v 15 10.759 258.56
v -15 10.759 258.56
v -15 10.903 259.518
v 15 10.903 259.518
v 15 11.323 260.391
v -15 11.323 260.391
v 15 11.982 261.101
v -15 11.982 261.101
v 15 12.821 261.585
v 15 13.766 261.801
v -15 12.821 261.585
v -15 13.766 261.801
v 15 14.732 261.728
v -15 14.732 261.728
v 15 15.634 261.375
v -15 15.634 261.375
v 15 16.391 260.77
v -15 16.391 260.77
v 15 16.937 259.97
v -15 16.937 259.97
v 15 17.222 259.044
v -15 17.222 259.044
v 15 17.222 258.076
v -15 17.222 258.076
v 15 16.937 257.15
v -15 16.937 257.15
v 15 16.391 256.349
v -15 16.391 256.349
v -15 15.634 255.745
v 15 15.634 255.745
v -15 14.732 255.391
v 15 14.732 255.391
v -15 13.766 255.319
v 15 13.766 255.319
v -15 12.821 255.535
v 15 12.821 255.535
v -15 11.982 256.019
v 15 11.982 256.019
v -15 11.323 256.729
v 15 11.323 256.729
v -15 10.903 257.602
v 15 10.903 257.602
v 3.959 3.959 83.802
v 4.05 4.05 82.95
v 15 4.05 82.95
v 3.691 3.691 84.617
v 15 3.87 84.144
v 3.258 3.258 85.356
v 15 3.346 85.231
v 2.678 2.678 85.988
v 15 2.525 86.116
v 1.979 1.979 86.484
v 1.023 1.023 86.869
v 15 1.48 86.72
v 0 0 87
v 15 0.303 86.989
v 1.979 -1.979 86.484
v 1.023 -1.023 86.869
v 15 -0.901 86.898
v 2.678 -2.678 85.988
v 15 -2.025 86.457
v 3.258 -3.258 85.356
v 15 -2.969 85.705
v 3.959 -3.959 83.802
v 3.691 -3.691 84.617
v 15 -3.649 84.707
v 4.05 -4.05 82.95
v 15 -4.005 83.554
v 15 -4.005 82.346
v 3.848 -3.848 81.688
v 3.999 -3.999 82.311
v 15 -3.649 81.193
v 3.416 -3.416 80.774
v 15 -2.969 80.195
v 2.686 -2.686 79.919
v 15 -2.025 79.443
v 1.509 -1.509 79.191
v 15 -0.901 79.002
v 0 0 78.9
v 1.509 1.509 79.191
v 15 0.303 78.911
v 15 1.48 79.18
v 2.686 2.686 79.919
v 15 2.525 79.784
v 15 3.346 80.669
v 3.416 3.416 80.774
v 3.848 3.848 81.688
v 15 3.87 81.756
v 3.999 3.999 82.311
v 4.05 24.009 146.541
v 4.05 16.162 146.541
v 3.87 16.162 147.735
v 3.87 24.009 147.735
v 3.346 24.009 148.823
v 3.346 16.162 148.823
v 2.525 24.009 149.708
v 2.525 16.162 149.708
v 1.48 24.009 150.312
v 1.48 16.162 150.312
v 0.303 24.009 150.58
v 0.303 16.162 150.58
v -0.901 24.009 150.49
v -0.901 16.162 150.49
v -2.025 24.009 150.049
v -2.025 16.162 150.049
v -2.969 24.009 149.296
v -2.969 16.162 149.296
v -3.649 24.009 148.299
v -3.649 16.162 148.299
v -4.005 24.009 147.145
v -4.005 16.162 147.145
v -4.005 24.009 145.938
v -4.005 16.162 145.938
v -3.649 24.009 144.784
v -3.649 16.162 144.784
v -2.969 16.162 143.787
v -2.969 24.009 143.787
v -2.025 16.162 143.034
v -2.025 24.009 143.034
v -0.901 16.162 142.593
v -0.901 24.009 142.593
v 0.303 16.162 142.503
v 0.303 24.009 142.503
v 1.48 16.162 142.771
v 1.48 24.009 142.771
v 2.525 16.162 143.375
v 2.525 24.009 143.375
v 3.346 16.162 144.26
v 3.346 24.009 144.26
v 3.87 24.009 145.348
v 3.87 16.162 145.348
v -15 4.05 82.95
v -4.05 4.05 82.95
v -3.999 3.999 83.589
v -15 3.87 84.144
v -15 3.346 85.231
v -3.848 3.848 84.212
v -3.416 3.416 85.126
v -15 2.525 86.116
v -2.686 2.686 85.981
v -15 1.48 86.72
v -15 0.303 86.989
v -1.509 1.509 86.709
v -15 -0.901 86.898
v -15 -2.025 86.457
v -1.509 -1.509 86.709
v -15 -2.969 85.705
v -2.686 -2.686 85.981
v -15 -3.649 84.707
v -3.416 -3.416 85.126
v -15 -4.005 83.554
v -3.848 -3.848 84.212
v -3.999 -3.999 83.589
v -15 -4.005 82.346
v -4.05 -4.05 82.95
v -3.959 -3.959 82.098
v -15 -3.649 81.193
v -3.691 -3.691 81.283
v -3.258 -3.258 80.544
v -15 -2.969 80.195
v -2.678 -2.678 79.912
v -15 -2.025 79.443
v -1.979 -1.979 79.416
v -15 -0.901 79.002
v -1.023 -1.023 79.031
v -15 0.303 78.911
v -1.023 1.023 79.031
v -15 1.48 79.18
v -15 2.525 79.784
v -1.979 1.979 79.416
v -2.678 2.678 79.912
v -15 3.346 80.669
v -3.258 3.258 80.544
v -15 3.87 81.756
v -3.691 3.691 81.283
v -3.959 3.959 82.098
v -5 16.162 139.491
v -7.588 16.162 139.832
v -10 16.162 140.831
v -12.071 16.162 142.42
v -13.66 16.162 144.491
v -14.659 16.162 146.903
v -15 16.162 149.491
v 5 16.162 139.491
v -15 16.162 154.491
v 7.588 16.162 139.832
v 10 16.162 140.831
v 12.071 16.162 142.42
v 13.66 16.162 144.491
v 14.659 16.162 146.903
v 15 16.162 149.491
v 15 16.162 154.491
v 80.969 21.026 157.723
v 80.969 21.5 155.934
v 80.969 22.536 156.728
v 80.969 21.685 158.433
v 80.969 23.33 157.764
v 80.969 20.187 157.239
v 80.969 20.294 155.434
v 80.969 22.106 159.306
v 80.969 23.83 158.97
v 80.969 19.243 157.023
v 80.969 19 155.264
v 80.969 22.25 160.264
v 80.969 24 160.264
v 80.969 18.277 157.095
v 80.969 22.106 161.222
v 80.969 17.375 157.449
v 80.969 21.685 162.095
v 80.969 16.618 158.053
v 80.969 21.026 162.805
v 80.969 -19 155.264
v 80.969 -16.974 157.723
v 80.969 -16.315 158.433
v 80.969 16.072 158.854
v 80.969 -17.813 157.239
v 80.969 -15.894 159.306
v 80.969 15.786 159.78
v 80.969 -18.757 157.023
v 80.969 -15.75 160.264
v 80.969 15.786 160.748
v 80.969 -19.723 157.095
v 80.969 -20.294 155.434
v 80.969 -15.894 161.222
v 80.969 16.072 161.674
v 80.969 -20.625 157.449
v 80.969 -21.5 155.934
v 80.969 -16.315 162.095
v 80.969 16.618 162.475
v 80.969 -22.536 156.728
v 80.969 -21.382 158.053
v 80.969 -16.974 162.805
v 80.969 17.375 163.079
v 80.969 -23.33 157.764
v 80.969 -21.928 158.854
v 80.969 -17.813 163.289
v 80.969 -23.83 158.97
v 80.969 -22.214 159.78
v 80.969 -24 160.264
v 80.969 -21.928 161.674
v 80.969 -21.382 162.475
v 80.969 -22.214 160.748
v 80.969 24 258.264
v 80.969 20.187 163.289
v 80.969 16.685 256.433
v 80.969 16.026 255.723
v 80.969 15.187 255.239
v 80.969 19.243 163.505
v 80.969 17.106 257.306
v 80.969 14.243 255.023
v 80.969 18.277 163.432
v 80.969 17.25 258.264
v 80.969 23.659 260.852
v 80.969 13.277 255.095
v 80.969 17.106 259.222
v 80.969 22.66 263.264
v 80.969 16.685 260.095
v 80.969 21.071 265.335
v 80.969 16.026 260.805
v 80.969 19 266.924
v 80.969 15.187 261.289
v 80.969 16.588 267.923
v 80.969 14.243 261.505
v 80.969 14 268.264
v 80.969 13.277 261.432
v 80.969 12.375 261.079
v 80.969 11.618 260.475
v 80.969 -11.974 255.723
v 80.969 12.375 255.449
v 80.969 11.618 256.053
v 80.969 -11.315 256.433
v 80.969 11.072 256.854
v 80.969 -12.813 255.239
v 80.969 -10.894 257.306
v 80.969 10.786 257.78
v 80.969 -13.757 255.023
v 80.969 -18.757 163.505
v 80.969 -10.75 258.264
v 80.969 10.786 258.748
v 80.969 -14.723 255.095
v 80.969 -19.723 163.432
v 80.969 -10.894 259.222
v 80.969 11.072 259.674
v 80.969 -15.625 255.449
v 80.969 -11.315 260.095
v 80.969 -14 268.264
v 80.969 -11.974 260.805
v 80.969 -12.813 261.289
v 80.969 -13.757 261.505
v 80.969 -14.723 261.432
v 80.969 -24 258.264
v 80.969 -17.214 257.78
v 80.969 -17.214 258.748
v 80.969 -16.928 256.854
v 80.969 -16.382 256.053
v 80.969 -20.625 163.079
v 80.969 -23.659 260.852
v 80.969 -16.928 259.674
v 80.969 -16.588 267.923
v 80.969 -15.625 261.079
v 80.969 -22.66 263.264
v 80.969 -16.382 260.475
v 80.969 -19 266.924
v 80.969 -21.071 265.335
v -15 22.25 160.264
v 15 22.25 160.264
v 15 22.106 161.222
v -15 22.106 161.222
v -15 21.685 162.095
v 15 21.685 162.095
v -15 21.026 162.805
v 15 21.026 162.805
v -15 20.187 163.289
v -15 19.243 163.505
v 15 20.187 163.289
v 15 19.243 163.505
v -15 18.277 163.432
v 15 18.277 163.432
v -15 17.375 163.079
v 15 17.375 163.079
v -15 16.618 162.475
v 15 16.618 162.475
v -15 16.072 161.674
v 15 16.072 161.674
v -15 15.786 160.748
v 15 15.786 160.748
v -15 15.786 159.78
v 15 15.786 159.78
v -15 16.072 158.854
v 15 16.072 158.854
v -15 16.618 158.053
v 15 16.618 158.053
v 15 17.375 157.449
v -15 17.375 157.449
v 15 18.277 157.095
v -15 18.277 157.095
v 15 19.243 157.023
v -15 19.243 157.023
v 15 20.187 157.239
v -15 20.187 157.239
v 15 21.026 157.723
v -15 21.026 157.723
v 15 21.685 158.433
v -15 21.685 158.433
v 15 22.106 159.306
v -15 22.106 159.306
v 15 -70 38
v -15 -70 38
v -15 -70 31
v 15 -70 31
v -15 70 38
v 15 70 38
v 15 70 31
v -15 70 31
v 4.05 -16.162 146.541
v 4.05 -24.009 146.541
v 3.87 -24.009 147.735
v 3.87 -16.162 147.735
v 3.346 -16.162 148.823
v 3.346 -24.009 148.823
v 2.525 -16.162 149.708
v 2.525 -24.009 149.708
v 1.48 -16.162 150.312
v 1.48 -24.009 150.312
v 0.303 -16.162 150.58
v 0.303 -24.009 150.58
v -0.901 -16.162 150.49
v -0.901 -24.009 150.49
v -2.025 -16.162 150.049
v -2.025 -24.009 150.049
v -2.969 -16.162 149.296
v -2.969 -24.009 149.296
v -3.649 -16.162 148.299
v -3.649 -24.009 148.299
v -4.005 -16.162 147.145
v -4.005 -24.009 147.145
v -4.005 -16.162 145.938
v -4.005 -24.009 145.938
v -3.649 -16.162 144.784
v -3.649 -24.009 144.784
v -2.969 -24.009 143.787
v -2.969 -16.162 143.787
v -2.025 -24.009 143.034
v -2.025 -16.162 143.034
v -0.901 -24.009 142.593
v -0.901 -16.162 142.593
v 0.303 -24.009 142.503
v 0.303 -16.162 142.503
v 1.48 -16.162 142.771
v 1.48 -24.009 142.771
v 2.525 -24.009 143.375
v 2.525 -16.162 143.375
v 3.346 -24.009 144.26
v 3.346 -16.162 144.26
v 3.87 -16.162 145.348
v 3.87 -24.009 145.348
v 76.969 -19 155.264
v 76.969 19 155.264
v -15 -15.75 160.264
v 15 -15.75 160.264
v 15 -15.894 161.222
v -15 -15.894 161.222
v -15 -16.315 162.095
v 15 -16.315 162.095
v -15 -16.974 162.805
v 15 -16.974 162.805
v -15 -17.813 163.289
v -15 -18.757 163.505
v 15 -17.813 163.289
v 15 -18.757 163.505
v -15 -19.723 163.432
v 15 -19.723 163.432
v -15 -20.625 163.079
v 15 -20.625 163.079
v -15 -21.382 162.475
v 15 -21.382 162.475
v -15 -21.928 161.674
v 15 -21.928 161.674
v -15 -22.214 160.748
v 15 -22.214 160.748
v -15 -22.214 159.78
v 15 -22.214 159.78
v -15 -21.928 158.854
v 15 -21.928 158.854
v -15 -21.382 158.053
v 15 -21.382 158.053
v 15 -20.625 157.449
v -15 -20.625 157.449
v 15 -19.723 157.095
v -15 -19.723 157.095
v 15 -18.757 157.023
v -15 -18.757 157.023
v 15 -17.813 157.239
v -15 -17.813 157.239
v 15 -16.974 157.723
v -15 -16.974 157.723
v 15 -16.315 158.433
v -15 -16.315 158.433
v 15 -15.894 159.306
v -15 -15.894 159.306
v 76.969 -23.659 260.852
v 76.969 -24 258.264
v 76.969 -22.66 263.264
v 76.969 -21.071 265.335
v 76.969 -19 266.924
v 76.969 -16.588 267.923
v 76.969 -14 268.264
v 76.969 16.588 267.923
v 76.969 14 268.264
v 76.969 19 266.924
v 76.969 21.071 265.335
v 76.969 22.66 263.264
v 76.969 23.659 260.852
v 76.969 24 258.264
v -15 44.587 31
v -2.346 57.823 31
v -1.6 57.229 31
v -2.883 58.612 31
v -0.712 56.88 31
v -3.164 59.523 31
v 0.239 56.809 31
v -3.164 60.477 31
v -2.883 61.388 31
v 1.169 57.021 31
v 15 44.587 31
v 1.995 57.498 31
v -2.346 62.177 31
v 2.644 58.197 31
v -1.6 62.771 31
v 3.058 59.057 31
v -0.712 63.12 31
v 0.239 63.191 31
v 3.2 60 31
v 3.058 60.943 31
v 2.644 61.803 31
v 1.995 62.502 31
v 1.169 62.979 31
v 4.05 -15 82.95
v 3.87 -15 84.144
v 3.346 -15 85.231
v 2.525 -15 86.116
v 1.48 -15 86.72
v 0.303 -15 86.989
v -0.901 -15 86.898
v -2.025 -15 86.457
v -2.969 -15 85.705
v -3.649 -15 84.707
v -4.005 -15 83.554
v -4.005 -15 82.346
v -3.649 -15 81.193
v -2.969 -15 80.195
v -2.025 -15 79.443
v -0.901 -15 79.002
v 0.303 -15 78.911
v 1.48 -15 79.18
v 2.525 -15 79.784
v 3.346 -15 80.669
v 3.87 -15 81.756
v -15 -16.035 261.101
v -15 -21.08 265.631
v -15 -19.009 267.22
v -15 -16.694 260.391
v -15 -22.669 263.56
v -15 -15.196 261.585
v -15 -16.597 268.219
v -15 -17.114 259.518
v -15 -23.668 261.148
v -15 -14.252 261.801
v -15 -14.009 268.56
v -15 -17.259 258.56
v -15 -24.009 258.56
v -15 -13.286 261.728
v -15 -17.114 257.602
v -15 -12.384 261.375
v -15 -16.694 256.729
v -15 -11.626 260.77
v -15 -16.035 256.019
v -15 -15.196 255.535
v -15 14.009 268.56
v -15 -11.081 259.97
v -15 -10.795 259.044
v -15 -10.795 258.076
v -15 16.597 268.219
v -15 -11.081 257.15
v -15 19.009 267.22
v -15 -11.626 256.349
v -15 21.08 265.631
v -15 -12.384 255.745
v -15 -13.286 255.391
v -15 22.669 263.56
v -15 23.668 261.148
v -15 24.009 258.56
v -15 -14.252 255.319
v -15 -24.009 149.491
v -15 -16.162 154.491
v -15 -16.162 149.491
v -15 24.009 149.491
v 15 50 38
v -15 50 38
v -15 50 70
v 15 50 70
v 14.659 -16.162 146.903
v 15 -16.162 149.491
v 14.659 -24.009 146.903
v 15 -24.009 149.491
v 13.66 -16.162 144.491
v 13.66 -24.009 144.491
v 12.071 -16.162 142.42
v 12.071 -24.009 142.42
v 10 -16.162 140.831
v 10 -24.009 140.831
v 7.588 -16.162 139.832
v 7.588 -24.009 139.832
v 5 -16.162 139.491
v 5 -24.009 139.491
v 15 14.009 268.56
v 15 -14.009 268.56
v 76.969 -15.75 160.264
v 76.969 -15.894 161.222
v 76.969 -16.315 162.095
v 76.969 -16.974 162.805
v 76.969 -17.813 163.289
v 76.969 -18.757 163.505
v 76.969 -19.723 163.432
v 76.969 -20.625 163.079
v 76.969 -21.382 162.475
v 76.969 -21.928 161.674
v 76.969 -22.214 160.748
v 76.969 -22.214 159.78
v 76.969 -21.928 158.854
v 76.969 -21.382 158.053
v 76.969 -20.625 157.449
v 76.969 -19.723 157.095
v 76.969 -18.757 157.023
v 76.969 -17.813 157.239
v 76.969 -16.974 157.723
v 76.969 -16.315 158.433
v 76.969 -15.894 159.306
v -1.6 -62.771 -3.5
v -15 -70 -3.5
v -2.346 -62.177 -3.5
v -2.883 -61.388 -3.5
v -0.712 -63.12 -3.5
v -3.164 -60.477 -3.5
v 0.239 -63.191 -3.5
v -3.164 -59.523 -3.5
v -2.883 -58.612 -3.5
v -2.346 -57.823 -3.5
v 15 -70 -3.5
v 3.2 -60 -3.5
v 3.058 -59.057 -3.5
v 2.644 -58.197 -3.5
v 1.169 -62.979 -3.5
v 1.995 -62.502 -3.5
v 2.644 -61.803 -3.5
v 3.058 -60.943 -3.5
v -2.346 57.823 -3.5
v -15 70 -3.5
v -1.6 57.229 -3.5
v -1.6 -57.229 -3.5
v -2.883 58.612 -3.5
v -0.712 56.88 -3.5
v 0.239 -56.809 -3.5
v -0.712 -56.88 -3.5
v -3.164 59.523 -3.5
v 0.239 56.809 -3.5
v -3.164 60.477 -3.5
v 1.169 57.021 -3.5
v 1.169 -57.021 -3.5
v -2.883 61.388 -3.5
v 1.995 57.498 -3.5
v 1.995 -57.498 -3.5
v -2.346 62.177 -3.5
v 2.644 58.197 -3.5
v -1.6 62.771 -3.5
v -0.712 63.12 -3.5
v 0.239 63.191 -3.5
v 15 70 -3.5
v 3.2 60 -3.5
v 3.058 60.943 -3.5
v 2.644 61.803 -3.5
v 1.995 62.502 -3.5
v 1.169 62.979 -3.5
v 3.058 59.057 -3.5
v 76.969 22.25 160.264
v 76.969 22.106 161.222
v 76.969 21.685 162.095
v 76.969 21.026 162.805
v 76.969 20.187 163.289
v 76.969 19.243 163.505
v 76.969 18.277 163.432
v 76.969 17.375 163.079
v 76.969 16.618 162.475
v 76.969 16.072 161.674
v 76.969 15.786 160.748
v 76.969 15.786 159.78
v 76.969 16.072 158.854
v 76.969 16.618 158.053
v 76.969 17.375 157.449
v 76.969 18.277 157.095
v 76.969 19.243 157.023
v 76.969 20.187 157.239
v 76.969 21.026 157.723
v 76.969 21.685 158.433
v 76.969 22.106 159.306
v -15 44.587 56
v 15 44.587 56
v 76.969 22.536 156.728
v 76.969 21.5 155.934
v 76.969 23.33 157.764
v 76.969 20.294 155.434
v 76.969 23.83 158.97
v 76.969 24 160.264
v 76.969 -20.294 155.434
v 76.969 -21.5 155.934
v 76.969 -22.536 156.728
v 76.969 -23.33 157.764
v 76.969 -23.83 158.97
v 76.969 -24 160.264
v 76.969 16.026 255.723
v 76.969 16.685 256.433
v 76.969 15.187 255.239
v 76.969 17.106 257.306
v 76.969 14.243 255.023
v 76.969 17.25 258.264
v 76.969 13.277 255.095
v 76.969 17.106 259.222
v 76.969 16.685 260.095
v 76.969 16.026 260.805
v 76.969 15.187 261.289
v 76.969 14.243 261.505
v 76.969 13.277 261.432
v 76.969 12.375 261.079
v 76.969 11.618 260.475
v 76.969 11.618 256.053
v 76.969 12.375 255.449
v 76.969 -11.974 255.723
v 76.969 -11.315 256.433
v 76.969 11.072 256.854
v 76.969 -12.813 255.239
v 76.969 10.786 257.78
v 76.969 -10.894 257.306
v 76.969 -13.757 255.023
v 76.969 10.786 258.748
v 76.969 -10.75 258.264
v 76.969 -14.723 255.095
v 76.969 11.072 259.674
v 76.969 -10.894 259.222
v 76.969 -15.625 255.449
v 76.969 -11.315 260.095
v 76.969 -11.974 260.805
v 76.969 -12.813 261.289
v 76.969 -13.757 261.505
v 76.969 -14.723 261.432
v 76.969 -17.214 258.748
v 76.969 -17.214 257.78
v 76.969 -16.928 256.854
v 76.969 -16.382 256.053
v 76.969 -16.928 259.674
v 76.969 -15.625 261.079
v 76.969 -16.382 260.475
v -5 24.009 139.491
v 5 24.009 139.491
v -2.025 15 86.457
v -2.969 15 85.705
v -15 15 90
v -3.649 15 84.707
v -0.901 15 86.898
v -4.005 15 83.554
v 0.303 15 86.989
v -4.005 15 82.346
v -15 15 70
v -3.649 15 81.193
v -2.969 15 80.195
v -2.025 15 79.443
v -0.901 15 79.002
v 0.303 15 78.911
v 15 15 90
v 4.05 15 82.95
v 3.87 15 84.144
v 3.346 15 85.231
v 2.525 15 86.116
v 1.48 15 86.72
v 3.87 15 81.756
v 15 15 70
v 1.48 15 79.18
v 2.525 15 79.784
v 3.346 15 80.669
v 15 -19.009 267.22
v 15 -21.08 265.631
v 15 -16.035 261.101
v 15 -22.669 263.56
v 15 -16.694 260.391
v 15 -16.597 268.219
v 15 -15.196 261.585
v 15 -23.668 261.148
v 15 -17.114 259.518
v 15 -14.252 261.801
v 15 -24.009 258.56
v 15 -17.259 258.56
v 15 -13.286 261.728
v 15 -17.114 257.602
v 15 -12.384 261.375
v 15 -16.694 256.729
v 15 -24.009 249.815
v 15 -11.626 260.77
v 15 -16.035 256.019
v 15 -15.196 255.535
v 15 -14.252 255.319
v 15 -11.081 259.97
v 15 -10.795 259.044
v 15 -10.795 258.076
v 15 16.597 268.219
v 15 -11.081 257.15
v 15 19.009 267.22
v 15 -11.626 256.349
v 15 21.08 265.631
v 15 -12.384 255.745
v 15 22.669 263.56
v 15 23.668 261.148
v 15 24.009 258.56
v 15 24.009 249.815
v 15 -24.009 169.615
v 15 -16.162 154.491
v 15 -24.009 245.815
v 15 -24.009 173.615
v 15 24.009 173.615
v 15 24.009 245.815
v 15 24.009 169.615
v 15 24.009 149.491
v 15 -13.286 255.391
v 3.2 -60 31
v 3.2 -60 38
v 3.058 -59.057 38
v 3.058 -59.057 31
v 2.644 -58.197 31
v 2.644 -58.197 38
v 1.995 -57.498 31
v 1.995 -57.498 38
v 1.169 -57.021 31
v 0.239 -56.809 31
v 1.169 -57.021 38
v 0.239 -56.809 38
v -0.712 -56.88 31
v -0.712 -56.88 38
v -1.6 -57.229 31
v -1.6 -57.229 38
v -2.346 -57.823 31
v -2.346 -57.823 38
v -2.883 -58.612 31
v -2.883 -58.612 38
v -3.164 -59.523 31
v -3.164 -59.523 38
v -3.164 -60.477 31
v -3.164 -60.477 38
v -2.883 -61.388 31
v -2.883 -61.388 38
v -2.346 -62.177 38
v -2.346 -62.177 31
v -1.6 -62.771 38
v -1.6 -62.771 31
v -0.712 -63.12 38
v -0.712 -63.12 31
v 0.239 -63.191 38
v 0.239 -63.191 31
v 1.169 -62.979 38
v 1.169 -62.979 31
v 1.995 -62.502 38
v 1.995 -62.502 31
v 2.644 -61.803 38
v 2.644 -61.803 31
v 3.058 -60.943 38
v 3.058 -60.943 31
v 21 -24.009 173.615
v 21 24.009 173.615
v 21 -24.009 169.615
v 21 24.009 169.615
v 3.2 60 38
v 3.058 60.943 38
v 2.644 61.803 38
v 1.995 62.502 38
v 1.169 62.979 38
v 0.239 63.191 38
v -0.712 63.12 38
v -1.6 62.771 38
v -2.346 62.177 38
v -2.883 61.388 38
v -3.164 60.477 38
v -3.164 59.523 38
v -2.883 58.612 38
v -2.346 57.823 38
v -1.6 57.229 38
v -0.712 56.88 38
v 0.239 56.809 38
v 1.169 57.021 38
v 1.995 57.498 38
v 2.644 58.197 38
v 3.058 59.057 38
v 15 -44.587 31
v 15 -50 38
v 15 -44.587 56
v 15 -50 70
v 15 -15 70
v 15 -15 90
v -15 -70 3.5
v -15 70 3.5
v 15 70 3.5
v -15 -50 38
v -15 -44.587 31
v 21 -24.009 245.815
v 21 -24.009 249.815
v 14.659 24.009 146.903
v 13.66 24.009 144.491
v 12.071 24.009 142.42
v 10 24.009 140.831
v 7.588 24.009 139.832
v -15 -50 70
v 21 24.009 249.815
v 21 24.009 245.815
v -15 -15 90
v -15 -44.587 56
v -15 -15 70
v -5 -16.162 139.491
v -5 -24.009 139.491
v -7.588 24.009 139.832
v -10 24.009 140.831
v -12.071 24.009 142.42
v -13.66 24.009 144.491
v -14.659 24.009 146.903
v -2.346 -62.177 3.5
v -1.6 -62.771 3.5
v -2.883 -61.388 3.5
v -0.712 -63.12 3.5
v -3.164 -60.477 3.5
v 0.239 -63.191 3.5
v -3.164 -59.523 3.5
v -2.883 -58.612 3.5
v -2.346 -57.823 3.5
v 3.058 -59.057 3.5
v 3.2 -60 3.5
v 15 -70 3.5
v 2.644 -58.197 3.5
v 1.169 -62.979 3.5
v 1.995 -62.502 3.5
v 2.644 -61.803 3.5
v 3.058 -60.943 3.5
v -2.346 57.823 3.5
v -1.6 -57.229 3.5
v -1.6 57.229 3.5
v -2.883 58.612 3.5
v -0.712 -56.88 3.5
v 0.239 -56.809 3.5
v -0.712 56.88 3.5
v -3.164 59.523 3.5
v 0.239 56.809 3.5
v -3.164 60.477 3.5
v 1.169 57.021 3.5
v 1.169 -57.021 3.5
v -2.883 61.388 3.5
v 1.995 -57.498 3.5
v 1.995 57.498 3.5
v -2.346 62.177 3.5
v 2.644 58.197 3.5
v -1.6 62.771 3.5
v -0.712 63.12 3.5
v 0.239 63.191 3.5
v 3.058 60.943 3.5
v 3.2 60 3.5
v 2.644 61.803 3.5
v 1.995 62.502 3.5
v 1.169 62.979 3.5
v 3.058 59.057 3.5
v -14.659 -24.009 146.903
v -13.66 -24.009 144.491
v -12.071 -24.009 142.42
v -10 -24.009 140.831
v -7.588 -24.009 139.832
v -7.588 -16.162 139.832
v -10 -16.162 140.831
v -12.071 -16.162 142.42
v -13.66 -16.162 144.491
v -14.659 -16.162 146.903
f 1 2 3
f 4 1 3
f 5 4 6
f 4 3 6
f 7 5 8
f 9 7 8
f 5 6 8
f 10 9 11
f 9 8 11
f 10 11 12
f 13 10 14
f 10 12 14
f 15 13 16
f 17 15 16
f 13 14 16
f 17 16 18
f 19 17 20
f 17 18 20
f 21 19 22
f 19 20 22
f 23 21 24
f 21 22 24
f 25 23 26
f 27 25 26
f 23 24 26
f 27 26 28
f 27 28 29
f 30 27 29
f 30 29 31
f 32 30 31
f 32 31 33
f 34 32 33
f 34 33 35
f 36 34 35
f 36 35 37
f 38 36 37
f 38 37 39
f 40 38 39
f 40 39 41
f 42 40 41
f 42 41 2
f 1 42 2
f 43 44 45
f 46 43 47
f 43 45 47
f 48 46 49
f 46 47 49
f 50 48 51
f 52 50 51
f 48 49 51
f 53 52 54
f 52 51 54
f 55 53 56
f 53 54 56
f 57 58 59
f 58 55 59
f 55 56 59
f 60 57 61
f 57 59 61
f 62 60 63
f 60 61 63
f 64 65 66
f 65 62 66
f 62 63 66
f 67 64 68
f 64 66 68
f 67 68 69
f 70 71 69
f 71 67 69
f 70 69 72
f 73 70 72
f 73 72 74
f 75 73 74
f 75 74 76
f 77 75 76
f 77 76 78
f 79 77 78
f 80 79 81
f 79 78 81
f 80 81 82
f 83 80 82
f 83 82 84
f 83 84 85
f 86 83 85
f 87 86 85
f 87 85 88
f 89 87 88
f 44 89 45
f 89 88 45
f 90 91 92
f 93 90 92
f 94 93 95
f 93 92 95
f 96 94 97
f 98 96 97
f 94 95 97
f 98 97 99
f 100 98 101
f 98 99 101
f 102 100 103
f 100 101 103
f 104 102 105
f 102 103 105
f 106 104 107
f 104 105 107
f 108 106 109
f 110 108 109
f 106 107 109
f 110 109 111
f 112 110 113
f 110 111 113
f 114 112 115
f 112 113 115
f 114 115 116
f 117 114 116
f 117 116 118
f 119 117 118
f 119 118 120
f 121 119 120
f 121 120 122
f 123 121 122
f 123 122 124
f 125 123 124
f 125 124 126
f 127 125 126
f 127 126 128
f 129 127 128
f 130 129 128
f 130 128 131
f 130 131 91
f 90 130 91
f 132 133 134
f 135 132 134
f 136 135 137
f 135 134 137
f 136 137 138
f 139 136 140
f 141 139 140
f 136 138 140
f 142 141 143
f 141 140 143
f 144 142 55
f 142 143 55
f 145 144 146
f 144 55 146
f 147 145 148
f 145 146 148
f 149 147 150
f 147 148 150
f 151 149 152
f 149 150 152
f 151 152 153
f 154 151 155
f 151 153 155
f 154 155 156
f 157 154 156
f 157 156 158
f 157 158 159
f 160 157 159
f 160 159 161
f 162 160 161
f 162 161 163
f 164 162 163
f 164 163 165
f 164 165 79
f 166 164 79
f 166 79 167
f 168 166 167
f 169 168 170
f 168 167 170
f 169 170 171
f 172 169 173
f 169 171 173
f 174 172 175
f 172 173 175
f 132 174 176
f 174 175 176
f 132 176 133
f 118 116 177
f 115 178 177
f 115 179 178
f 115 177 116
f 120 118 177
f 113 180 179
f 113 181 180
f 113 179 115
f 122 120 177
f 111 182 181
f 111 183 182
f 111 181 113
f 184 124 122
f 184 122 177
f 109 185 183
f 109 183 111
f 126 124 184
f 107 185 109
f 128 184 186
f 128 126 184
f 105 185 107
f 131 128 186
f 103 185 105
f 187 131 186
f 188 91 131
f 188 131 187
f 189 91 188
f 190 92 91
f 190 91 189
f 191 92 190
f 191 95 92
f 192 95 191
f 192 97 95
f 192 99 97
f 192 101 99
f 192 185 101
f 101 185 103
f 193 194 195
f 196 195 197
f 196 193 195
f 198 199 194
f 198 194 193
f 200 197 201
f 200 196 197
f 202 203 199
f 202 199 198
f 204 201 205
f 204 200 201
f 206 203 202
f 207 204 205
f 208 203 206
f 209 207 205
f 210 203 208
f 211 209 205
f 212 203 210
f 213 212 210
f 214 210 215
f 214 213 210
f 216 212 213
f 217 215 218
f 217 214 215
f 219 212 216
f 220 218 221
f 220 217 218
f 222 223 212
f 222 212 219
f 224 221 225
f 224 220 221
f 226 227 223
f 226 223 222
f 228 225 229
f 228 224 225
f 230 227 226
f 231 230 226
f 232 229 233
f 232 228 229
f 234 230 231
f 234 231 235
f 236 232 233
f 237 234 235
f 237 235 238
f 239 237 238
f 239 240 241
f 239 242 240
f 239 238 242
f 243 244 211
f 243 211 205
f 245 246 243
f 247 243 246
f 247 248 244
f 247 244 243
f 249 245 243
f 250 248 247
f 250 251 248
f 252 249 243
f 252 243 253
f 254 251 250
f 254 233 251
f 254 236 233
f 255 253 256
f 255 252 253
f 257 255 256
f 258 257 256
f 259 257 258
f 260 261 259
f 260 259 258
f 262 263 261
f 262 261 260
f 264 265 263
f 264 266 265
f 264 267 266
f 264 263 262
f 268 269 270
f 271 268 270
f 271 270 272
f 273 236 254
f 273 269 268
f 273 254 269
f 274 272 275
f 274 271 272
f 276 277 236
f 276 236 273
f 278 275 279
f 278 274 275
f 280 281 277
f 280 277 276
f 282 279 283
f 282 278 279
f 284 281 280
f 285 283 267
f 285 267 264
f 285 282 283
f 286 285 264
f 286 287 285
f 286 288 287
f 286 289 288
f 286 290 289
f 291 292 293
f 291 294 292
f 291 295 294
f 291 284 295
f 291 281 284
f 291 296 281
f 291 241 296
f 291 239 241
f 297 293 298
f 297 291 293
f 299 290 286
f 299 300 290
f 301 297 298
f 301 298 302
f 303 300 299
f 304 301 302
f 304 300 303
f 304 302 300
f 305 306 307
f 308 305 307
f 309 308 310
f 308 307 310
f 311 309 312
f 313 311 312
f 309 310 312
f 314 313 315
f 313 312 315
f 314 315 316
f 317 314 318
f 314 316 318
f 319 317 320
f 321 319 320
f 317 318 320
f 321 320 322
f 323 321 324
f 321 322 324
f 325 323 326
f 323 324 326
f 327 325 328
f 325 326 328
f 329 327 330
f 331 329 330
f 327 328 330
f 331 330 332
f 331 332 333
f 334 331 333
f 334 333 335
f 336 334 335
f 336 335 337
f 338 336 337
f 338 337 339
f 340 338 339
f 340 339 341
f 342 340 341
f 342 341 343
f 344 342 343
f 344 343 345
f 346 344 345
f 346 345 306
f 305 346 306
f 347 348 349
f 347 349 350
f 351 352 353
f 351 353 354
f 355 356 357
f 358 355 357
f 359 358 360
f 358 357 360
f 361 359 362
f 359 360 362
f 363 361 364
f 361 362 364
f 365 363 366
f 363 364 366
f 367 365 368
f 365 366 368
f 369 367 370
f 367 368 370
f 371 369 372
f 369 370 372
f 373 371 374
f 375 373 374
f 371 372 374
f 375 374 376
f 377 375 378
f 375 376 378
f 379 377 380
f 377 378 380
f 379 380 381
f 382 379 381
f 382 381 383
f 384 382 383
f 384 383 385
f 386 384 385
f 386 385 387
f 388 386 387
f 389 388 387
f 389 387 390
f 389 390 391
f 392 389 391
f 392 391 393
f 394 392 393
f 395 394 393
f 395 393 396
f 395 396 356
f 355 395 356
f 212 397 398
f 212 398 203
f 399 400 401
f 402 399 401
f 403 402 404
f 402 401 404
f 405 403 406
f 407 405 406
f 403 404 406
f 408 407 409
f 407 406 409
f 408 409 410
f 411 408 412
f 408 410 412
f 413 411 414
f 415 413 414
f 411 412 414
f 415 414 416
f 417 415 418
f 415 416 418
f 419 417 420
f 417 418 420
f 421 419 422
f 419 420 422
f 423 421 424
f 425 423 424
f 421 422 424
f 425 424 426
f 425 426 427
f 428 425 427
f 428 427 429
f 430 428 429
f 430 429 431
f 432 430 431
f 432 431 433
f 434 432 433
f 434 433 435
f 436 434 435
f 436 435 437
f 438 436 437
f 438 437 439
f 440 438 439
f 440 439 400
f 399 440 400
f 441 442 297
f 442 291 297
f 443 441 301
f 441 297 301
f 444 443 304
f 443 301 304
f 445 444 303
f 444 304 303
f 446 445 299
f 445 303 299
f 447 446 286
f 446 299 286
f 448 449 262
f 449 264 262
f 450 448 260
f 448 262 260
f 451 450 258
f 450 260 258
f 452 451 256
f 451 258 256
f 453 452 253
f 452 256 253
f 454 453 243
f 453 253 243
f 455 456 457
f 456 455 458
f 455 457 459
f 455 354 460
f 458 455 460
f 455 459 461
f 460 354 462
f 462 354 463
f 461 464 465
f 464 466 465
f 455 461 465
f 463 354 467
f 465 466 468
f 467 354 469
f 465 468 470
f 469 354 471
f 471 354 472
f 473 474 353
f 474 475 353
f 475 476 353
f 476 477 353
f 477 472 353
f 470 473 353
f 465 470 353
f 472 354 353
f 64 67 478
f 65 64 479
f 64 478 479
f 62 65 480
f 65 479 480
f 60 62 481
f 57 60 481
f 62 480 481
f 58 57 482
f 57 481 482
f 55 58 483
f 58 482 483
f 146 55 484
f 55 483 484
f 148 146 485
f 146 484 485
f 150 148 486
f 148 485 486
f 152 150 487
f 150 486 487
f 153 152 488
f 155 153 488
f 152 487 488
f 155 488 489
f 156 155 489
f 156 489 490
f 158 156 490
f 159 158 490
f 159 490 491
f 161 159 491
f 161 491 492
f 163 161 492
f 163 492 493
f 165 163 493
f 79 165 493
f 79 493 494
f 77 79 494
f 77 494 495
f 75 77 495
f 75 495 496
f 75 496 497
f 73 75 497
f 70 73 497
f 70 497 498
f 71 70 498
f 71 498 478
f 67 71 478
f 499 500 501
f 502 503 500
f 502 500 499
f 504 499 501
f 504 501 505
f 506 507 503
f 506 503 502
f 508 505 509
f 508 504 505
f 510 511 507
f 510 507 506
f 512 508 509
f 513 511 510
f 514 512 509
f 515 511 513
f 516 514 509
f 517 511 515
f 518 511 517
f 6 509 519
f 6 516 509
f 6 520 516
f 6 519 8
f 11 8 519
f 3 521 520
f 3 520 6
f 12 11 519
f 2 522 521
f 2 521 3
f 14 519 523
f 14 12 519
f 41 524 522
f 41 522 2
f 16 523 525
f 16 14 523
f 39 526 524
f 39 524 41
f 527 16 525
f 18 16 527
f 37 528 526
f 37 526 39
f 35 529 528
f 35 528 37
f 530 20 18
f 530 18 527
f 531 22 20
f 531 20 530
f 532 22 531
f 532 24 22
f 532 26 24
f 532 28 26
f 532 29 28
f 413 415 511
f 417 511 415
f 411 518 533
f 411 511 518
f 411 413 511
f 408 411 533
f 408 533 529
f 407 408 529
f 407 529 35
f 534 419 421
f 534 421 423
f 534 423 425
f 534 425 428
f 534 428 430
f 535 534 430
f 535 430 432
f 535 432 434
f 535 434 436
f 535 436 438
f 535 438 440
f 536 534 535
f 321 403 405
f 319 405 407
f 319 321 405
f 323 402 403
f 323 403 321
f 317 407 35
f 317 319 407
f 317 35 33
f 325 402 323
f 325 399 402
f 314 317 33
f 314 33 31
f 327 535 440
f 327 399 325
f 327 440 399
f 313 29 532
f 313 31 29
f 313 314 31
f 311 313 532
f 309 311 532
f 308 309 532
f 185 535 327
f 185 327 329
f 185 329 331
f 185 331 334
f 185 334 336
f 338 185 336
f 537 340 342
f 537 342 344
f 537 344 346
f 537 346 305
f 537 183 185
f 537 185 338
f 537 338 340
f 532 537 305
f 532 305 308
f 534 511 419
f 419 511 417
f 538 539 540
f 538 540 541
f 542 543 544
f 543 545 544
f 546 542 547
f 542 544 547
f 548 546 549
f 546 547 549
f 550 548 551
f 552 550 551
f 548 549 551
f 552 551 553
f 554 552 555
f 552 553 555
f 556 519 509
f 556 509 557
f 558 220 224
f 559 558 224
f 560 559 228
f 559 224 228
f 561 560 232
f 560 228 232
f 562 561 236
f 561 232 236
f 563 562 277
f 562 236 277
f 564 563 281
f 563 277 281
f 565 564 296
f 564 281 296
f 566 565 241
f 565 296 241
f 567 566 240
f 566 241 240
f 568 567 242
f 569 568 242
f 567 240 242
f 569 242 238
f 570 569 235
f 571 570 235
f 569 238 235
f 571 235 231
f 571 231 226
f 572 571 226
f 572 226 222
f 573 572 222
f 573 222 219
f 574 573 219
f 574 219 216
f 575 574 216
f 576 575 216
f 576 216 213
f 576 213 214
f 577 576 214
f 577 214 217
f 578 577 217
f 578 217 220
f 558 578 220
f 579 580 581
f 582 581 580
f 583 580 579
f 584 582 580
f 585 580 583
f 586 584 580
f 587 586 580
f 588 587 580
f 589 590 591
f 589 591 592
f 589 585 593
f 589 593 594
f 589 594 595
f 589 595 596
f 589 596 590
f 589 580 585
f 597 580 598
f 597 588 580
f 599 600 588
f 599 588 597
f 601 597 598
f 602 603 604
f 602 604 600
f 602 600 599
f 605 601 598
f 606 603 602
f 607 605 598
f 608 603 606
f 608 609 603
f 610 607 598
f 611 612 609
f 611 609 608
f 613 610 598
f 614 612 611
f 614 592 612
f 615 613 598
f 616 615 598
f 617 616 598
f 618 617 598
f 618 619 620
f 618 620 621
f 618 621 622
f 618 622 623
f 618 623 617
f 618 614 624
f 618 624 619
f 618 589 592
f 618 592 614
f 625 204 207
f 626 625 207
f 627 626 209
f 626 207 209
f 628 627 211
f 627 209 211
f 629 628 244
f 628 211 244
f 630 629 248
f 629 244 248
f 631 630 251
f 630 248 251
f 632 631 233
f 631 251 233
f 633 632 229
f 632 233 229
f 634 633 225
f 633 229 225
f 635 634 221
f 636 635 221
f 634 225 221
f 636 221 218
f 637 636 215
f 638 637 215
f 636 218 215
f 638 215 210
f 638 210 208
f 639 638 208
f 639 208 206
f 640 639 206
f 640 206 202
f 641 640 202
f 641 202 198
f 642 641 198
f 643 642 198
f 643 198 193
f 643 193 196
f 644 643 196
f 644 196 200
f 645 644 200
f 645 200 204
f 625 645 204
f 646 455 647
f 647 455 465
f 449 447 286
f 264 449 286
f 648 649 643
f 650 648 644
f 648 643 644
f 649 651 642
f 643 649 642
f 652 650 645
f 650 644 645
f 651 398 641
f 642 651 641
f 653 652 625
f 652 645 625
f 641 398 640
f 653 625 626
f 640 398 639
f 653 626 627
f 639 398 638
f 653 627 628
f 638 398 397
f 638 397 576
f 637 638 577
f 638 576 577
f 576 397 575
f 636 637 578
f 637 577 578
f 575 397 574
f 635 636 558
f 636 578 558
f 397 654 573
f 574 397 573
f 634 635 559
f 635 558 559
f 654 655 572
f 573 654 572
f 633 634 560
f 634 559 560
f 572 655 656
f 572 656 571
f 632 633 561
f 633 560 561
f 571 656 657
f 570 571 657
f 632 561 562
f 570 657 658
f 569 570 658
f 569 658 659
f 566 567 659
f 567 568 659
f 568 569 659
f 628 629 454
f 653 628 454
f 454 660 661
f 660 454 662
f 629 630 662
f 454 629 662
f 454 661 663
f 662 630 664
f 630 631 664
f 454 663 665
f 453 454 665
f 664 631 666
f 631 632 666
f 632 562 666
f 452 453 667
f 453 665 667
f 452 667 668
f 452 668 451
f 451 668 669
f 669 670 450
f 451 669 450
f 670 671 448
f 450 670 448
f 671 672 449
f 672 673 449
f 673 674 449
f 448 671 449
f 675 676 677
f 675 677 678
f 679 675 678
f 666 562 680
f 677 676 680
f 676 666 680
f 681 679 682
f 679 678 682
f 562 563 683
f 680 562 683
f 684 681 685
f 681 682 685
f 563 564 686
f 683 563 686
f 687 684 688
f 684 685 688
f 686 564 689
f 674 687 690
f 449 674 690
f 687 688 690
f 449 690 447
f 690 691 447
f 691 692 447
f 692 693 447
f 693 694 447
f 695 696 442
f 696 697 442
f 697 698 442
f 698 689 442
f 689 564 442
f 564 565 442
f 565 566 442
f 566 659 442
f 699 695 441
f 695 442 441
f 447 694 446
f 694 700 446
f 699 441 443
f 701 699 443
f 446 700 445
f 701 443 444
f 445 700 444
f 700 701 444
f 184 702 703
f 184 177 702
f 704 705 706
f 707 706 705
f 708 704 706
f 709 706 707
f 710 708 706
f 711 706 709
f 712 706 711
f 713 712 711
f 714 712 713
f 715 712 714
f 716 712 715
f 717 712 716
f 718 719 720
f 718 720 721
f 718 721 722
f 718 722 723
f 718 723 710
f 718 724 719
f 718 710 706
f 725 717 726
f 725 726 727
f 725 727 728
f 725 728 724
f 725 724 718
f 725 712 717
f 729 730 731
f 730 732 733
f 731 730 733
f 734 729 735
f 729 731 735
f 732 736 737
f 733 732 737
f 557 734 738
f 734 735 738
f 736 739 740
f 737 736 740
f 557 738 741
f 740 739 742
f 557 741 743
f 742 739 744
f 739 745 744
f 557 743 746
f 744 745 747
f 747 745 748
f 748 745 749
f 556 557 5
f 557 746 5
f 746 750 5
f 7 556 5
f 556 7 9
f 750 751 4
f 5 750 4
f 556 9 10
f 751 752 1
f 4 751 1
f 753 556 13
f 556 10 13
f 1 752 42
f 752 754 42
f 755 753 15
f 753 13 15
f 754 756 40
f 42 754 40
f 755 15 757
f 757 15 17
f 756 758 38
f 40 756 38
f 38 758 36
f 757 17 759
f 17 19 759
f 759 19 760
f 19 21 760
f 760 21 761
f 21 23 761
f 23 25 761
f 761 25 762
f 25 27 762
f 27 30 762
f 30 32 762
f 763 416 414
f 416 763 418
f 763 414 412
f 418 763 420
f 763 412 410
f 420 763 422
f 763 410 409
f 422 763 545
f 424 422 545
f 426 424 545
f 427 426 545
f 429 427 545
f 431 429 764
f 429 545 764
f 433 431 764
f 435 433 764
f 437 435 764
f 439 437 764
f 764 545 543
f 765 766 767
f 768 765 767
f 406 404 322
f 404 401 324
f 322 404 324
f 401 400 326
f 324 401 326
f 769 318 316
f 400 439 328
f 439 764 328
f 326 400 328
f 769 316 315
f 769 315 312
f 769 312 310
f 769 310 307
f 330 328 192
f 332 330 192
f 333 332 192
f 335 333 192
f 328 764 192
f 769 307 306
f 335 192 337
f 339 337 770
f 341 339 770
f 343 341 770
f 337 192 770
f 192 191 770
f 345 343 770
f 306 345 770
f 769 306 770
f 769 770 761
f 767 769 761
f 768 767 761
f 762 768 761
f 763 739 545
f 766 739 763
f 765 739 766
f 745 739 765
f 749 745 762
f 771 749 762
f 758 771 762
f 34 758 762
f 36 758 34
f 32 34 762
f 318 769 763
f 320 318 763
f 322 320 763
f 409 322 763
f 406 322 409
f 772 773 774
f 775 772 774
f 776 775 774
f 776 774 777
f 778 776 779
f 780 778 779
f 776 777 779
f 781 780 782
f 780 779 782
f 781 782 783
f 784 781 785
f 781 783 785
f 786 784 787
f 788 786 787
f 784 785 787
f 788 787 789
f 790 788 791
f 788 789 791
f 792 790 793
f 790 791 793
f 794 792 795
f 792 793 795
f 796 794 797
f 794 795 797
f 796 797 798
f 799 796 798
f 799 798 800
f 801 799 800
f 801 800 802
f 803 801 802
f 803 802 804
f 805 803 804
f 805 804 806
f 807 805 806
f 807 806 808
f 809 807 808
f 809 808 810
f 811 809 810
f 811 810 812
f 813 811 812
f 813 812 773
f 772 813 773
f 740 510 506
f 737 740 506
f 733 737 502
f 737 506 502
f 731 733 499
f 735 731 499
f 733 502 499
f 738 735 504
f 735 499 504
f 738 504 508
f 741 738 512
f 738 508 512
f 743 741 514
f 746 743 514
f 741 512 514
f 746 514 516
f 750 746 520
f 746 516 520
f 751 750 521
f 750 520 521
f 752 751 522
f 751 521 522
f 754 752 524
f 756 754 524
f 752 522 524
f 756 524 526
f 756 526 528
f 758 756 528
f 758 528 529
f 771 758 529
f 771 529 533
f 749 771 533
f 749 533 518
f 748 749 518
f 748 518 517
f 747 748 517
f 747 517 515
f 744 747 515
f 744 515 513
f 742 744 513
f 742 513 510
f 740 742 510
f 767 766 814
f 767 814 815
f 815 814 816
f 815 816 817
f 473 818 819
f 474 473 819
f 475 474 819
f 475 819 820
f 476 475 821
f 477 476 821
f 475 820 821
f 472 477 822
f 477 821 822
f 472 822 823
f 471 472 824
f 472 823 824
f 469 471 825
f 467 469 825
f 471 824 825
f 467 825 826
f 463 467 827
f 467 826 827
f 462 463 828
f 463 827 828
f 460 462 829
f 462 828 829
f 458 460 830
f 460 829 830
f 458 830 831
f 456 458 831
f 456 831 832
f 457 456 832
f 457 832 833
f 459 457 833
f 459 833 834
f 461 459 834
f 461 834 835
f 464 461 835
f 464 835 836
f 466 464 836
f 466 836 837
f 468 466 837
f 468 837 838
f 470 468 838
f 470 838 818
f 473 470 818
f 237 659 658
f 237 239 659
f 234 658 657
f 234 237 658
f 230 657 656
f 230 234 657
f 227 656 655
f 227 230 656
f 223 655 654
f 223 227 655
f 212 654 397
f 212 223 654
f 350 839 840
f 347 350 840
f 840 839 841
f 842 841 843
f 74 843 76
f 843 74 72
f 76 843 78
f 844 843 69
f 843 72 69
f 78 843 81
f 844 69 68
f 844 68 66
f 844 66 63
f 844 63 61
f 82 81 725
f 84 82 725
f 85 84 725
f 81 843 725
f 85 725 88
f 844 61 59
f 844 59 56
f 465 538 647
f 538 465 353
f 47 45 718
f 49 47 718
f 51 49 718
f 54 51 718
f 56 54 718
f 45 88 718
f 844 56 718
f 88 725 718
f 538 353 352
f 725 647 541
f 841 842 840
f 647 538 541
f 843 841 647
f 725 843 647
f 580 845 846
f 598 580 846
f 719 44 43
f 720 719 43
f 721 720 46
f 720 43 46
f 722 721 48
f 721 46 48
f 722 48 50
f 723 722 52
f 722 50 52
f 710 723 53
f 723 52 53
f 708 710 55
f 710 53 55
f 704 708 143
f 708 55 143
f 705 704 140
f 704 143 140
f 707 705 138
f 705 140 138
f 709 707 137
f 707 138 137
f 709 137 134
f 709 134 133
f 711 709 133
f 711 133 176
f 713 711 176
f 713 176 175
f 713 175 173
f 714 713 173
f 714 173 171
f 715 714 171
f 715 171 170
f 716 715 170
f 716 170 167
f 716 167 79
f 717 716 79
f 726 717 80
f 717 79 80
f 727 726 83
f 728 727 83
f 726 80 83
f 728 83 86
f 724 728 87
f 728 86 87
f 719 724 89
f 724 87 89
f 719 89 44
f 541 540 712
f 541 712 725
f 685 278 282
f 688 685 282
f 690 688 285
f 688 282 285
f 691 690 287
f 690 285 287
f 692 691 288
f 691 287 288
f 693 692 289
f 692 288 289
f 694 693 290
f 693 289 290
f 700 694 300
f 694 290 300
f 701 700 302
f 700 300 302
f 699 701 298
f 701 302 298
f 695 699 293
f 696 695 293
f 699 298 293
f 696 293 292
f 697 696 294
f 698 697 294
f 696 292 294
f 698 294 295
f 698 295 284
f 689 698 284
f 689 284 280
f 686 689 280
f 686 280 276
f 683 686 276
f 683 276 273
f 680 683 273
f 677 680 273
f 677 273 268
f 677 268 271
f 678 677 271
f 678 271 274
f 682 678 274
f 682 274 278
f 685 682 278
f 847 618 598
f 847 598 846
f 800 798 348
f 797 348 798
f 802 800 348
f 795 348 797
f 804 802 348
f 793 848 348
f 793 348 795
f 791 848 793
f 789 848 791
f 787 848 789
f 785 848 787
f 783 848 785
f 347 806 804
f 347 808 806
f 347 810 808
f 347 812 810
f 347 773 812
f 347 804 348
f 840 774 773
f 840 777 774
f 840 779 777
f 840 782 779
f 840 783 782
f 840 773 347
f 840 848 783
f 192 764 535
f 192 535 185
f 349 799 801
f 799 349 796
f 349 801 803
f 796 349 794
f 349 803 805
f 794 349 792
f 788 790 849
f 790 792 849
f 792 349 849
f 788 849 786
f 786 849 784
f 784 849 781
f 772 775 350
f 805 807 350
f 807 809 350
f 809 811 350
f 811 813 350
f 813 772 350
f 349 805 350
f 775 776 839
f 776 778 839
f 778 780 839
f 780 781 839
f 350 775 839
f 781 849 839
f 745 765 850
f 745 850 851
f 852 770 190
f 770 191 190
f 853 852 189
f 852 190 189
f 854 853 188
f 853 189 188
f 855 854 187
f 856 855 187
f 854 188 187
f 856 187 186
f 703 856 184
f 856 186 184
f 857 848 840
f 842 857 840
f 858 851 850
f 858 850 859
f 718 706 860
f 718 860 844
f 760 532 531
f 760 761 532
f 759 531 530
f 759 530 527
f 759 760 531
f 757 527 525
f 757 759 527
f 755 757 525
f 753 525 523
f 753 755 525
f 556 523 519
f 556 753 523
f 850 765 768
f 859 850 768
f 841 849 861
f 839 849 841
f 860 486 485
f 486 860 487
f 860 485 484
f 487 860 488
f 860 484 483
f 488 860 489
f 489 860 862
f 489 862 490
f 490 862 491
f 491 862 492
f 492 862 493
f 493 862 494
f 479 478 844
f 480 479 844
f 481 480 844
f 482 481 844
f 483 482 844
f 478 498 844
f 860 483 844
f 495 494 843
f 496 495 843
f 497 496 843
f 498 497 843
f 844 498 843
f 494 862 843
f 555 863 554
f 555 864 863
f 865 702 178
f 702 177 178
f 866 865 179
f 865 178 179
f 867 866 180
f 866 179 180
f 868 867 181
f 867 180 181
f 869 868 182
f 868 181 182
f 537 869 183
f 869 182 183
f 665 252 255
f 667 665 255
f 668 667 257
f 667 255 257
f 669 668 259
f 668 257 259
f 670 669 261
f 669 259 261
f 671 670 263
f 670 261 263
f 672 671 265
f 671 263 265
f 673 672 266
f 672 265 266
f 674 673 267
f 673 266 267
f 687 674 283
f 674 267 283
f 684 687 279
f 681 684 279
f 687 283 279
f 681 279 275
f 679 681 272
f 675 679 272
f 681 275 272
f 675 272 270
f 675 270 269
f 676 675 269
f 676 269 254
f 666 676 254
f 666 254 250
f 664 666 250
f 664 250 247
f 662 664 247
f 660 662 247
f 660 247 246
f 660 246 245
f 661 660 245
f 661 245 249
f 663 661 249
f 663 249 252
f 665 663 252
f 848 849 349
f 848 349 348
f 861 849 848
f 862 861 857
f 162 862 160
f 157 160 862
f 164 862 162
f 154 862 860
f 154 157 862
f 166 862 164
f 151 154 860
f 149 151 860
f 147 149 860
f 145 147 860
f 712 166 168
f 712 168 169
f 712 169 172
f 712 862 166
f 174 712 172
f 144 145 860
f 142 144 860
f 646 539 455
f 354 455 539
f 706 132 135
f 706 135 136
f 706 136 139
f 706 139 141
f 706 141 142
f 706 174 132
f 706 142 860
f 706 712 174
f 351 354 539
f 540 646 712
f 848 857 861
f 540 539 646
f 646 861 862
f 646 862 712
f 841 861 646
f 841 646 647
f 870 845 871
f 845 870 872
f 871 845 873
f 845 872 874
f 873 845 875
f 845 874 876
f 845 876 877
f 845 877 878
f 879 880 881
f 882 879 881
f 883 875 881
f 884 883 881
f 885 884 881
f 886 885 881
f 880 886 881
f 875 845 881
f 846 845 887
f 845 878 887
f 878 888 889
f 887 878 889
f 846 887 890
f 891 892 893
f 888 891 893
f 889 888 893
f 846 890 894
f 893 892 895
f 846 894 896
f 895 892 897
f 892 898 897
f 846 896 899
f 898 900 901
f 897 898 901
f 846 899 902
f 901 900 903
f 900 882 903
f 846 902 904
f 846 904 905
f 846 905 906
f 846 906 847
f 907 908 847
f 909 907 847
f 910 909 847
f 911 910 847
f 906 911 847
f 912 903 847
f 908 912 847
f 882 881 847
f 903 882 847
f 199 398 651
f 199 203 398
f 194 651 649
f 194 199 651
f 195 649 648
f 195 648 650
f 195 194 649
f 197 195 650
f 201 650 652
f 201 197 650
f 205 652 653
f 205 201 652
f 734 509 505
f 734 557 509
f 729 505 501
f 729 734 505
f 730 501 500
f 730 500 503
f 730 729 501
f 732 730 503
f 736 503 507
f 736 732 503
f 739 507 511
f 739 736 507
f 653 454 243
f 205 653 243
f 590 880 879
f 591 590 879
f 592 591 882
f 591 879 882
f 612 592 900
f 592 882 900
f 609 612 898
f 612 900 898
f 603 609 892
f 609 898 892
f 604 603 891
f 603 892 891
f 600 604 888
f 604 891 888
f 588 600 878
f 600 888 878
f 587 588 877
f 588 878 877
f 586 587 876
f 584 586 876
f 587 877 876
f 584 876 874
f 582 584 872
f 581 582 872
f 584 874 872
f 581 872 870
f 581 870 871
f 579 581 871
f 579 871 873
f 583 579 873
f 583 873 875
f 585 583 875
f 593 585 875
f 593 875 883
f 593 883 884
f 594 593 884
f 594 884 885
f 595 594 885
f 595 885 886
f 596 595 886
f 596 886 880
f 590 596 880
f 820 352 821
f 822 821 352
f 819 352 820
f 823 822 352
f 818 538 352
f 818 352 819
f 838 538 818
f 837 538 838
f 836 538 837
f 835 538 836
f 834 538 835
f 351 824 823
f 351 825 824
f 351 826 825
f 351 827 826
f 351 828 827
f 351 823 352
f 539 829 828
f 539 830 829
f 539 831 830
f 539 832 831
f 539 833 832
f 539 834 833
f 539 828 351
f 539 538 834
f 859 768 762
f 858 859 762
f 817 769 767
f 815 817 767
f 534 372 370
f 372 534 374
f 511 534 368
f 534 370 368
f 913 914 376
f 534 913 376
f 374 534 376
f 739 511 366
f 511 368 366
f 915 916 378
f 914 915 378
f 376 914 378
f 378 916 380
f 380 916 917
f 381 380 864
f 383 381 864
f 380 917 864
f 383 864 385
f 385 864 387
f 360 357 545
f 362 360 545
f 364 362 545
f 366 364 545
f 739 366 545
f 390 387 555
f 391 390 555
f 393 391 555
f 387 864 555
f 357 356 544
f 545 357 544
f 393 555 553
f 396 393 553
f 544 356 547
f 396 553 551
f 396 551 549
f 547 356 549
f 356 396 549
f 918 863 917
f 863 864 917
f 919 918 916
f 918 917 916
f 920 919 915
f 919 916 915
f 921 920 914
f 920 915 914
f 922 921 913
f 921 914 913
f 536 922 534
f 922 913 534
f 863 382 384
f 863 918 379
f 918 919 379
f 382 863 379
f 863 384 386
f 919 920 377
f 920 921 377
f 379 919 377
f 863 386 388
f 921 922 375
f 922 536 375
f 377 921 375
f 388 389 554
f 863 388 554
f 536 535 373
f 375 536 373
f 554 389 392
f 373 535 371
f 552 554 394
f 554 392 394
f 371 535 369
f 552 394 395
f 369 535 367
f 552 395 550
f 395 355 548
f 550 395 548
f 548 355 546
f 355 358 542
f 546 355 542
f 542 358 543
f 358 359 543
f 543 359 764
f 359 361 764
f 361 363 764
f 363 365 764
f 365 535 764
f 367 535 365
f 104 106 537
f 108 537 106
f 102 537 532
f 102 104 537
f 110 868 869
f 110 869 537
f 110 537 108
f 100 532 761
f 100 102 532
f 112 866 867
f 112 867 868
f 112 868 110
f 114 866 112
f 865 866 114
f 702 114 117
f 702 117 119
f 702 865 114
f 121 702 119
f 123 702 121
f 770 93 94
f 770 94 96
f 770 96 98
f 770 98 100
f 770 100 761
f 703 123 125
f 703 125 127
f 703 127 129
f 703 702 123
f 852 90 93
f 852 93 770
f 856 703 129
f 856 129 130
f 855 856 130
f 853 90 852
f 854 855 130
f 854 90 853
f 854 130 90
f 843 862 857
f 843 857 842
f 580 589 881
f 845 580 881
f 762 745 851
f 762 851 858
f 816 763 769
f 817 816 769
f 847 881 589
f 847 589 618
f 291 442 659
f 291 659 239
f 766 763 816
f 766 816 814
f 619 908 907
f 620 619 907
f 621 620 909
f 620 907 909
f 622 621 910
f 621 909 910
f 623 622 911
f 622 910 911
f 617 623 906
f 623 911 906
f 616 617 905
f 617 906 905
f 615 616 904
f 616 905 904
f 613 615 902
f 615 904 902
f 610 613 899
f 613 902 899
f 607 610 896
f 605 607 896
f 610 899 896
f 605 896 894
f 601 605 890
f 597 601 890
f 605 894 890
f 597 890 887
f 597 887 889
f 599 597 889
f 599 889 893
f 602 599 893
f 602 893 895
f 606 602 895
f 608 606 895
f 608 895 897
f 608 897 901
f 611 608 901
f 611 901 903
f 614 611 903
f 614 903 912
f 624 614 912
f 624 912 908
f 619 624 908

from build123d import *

# Parameters (mm, degrees)
F0_W      = 30
F0_H      = 100
F1_DEPTH  = 70
F2_W      = 30
F2_H      = 30
F3_DEPTH  = 20
F4_W      = 48.0175241828
F4_H      = 24.0684449673
F5_DEPTH  = 15
F6_W      = 30
F6_H      = 7.847
F7_DEPTH  = 15
F8_W      = 30
F8_H      = 7.847
F9_DEPTH  = 15
F10_R     = 10
F11_R     = 10
F12_R     = 10
F13_R     = 10
F14_R     = 4.05
F15_DEPTH = 31.5
F16_R     = 4.05
F17_DEPTH = 49.5
F18_W     = 30
F18_H     = 48.0175241828
F19_DEPTH = 90
F20_R     = 10
F21_R     = 10
F22_W     = 48.01752
F22_H     = 4
F23_DEPTH = 6
F24_W     = 4
F24_H     = 113
F25_DEPTH = 24
F26_R     = 10
F27_R     = 10
F28_R     = 3.25
F29_DEPTH = 95.9695533643
F30_R     = 5
F31_R     = 5
F32_R     = 3.25
F33_DEPTH = 34.6
F34_R     = 3.25
F35_DEPTH = 25
F36_R     = 3.25
F37_DEPTH = 108.8
F38_R     = 3.25
F39_DEPTH = 95.9695533643
F40_W     = 30
F40_H     = 100
F41_DEPTH = 31
F42_W     = 30
F42_H     = 7
F43_DEPTH = 20
F44_W     = 30
F44_H     = 7
F45_DEPTH = 20
F48_W     = 140
F48_H     = 7
F49_DEPTH = 15
F47_R     = 3.2
F50_DEPTH = 55.5
F46_R     = 3.2
F51_DEPTH = 61.8
F52_W     = 30
F52_H     = 89.1749337316
F53_DEPTH = 25
F54_R     = 4.05
F55_DEPTH = 32.4


with BuildPart() as f1:
    # F0 (on Top) → F1 (new body)
    with BuildSketch(Plane.XY):
        Rectangle(F0_W, F0_H)
    extrude(amount=F1_DEPTH)

    # F2 (on face) → F3 (join)
    with BuildSketch(Plane.XY.offset(70)):
        Rectangle(F2_W, F2_H)
    extrude(amount=F3_DEPTH)

    # F14 (on face) → F15 (cut)
    with BuildSketch(Plane.XZ.offset(15)):
        with Locations((0, 82.95)):
            Circle(F14_R)
    extrude(amount=-F15_DEPTH, mode=Mode.SUBTRACT)

    # F40 (on face) → F41 (cut)
    with BuildSketch(Plane(origin=(0, 0, 0), x_dir=(1, 0, 0), z_dir=(0, 0, -1))):
        Rectangle(F40_W, F40_H)
    extrude(amount=-F41_DEPTH, mode=Mode.SUBTRACT)

    # F42 (on face) → F43 (join)
    with BuildSketch(Plane(origin=(0, 50, 0), x_dir=(-1, 0, 0), z_dir=(0, 1, 0))):
        with Locations((0, 34.5)):
            Rectangle(F42_W, F42_H)
    extrude(amount=F43_DEPTH)

    # F44 (on face) → F45 (join)
    with BuildSketch(Plane.XZ.offset(50)):
        with Locations((0, 34.5)):
            Rectangle(F44_W, F44_H)
    extrude(amount=F45_DEPTH)


with BuildPart() as f5:
    # F4 (on Right) → F5 (new body, symmetric)
    with BuildSketch(Plane.YZ):
        with Locations((0, 166.5257066488)):
            Rectangle(F4_W, F4_H)
    extrude(amount=F5_DEPTH, both=True)

    # F6 (on face) → F7 (join)
    with BuildSketch(Plane(origin=(0, 0, 154.4914841652), x_dir=(1, 0, 0), z_dir=(0, 0, -1))):
        with Locations((0, -20.0852620914)):
            Rectangle(F6_W, F6_H)
    extrude(amount=F7_DEPTH)

    # F8 (on face) → F9 (join)
    with BuildSketch(Plane(origin=(0, 0, 154.4914841652), x_dir=(1, 0, 0), z_dir=(0, 0, -1))):
        with Locations((0, 20.0852620914)):
            Rectangle(F8_W, F8_H)
    extrude(amount=F9_DEPTH)

    # F10
    f10_edges = [f5.edges().sort_by_distance(p)[0] for p in [
        (15, -20.085262, 139.491484),
    ]]
    fillet(f10_edges, radius=F10_R)

    # F11
    f11_edges = [f5.edges().sort_by_distance(p)[0] for p in [
        (-15, -20.085262, 139.491484),
    ]]
    fillet(f11_edges, radius=F11_R)

    # F12
    f12_edges = [f5.edges().sort_by_distance(p)[0] for p in [
        (15, 20.085262, 139.491484),
    ]]
    fillet(f12_edges, radius=F12_R)

    # F13
    f13_edges = [f5.edges().sort_by_distance(p)[0] for p in [
        (-15, 20.085262, 139.491484),
    ]]
    fillet(f13_edges, radius=F13_R)

    # F16 (on face) → F17 (cut)
    with BuildSketch(Plane.XZ.offset(24.0087620914)):
        with Locations((0, 146.5414841652)):
            Circle(F16_R)
    extrude(amount=-F17_DEPTH, mode=Mode.SUBTRACT)

    # F18 (on face) → F19 (join)
    with BuildSketch(Plane.XY.offset(178.5599291325)):
        Rectangle(F18_W, F18_H)
    extrude(amount=F19_DEPTH)

    # F20
    f20_edges = [f5.edges().sort_by_distance(p)[0] for p in [
        (0, 24.008762, 268.559929),
    ]]
    fillet(f20_edges, radius=F20_R)

    # F21
    f21_edges = [f5.edges().sort_by_distance(p)[0] for p in [
        (0, -24.008762, 268.559929),
    ]]
    fillet(f21_edges, radius=F21_R)

    # F22 (on face) → F23 (join)
    with BuildSketch(Plane.YZ.offset(15)):
        with Locations((0, 247.8152513504)):
            Rectangle(F22_W, F22_H)
        with Locations((0, 171.6152513504)):
            Rectangle(F22_W, F22_H)
    extrude(amount=F23_DEPTH)

    # F32 (on face) → F33 (cut)
    with BuildSketch(Plane(origin=(-15, 0, 0), x_dir=(0, -1, 0), z_dir=(-1, 0, 0))):
        with Locations((-14.0087620914, 258.5599291325)):
            Circle(F32_R)
        with Locations((14.0087620914, 258.5599291325)):
            Circle(F32_R)
    extrude(amount=-F33_DEPTH, mode=Mode.SUBTRACT)


with BuildPart() as f25:
    # F24 (on Front) → F25 (new body, symmetric)
    with BuildSketch(Plane.XZ):
        with Locations((78.9685533643, 211.7639752626)):
            Rectangle(F24_W, F24_H)
    extrude(amount=F25_DEPTH, both=True)

    # F26
    f26_edges = [f25.edges().sort_by_distance(p)[0] for p in [
        (78.968553, -24, 268.263975),
    ]]
    fillet(f26_edges, radius=F26_R)

    # F27
    f27_edges = [f25.edges().sort_by_distance(p)[0] for p in [
        (78.968553, 24, 268.263975),
    ]]
    fillet(f27_edges, radius=F27_R)

    # F28 (on face) → F29 (cut, through all)
    with BuildSketch(Plane.YZ.offset(80.9685533643)):
        with Locations((-14, 258.2639752626)):
            Circle(F28_R)
    extrude(amount=-F29_DEPTH, mode=Mode.SUBTRACT)

    # F30
    f30_edges = [f25.edges().sort_by_distance(p)[0] for p in [
        (78.968553, -24, 155.263975),
    ]]
    fillet(f30_edges, radius=F30_R)

    # F31
    f31_edges = [f25.edges().sort_by_distance(p)[0] for p in [
        (78.968553, 24, 155.263975),
    ]]
    fillet(f31_edges, radius=F31_R)

    # F34 (on face) → F35 (cut)
    with BuildSketch(Plane.YZ.offset(80.9685533643)):
        with Locations((14, 258.2639752626)):
            Circle(F34_R)
    extrude(amount=-F35_DEPTH, mode=Mode.SUBTRACT)


with BuildPart() as f37_tool:
    # F36 (on face) → F37 (new body)
    with BuildSketch(Plane.YZ.offset(80.9685533643)):
        with Locations((-19, 160.2639752626)):
            Circle(F36_R)
    extrude(amount=-F37_DEPTH)


with BuildPart() as f5_1:
    add(f5.part)

    # F37: cut by f37_tool
    add(f37_tool.part, mode=Mode.SUBTRACT)


with BuildPart() as f25_1:
    add(f25.part)

    # F37: cut by f37_tool
    add(f37_tool.part, mode=Mode.SUBTRACT)


with BuildPart() as f39_tool:
    # F38 (on face) → F39 (new body, through all)
    with BuildSketch(Plane.YZ.offset(80.9685533643)):
        with Locations((19, 160.2639752626)):
            Circle(F38_R)
    extrude(amount=-F39_DEPTH)


with BuildPart() as f5_2:
    add(f5_1.part)

    # F39: cut by f39_tool
    add(f39_tool.part, mode=Mode.SUBTRACT)


with BuildPart() as f25_2:
    add(f25_1.part)

    # F39: cut by f39_tool
    add(f39_tool.part, mode=Mode.SUBTRACT)


with BuildPart() as f49:
    # F48 (on Right) → F49 (new body, symmetric)
    with BuildSketch(Plane.YZ):
        Rectangle(F48_W, F48_H)
    extrude(amount=F49_DEPTH, both=True)


with BuildPart() as f50_tool:
    # F47 (on face) → F50 (new body)
    with BuildSketch(Plane.XY.offset(38)):
        with Locations((0, -60)):
            Circle(F47_R)
    extrude(amount=-F50_DEPTH)


with BuildPart() as f1_1:
    add(f1.part)

    # F50: cut by f50_tool
    add(f50_tool.part, mode=Mode.SUBTRACT)


with BuildPart() as f49_1:
    add(f49.part)

    # F50: cut by f50_tool
    add(f50_tool.part, mode=Mode.SUBTRACT)


with BuildPart() as f51_tool:
    # F46 (on face) → F51 (new body)
    with BuildSketch(Plane.XY.offset(38)):
        with Locations((0, 60)):
            Circle(F46_R)
    extrude(amount=-F51_DEPTH)


with BuildPart() as f1_2:
    add(f1_1.part)

    # F51: cut by f51_tool
    add(f51_tool.part, mode=Mode.SUBTRACT)

    # F52 (on face) → F53 (cut)
    with BuildSketch(Plane(origin=(0, 0, 31), x_dir=(1, 0, 0), z_dir=(0, 0, -1))):
        Rectangle(F52_W, F52_H)
    extrude(amount=-F53_DEPTH, mode=Mode.SUBTRACT)

    # F54 (on face) → F55 (cut)
    with BuildSketch(Plane.YZ.offset(15)):
        with Locations((0, 82.95)):
            Circle(F54_R)
    extrude(amount=-F55_DEPTH, mode=Mode.SUBTRACT)


with BuildPart() as f49_2:
    add(f49_1.part)

    # F51: cut by f51_tool
    add(f51_tool.part, mode=Mode.SUBTRACT)


solid = Compound([f5_2.part, f25_2.part, f1_2.part, f49_2.part])
